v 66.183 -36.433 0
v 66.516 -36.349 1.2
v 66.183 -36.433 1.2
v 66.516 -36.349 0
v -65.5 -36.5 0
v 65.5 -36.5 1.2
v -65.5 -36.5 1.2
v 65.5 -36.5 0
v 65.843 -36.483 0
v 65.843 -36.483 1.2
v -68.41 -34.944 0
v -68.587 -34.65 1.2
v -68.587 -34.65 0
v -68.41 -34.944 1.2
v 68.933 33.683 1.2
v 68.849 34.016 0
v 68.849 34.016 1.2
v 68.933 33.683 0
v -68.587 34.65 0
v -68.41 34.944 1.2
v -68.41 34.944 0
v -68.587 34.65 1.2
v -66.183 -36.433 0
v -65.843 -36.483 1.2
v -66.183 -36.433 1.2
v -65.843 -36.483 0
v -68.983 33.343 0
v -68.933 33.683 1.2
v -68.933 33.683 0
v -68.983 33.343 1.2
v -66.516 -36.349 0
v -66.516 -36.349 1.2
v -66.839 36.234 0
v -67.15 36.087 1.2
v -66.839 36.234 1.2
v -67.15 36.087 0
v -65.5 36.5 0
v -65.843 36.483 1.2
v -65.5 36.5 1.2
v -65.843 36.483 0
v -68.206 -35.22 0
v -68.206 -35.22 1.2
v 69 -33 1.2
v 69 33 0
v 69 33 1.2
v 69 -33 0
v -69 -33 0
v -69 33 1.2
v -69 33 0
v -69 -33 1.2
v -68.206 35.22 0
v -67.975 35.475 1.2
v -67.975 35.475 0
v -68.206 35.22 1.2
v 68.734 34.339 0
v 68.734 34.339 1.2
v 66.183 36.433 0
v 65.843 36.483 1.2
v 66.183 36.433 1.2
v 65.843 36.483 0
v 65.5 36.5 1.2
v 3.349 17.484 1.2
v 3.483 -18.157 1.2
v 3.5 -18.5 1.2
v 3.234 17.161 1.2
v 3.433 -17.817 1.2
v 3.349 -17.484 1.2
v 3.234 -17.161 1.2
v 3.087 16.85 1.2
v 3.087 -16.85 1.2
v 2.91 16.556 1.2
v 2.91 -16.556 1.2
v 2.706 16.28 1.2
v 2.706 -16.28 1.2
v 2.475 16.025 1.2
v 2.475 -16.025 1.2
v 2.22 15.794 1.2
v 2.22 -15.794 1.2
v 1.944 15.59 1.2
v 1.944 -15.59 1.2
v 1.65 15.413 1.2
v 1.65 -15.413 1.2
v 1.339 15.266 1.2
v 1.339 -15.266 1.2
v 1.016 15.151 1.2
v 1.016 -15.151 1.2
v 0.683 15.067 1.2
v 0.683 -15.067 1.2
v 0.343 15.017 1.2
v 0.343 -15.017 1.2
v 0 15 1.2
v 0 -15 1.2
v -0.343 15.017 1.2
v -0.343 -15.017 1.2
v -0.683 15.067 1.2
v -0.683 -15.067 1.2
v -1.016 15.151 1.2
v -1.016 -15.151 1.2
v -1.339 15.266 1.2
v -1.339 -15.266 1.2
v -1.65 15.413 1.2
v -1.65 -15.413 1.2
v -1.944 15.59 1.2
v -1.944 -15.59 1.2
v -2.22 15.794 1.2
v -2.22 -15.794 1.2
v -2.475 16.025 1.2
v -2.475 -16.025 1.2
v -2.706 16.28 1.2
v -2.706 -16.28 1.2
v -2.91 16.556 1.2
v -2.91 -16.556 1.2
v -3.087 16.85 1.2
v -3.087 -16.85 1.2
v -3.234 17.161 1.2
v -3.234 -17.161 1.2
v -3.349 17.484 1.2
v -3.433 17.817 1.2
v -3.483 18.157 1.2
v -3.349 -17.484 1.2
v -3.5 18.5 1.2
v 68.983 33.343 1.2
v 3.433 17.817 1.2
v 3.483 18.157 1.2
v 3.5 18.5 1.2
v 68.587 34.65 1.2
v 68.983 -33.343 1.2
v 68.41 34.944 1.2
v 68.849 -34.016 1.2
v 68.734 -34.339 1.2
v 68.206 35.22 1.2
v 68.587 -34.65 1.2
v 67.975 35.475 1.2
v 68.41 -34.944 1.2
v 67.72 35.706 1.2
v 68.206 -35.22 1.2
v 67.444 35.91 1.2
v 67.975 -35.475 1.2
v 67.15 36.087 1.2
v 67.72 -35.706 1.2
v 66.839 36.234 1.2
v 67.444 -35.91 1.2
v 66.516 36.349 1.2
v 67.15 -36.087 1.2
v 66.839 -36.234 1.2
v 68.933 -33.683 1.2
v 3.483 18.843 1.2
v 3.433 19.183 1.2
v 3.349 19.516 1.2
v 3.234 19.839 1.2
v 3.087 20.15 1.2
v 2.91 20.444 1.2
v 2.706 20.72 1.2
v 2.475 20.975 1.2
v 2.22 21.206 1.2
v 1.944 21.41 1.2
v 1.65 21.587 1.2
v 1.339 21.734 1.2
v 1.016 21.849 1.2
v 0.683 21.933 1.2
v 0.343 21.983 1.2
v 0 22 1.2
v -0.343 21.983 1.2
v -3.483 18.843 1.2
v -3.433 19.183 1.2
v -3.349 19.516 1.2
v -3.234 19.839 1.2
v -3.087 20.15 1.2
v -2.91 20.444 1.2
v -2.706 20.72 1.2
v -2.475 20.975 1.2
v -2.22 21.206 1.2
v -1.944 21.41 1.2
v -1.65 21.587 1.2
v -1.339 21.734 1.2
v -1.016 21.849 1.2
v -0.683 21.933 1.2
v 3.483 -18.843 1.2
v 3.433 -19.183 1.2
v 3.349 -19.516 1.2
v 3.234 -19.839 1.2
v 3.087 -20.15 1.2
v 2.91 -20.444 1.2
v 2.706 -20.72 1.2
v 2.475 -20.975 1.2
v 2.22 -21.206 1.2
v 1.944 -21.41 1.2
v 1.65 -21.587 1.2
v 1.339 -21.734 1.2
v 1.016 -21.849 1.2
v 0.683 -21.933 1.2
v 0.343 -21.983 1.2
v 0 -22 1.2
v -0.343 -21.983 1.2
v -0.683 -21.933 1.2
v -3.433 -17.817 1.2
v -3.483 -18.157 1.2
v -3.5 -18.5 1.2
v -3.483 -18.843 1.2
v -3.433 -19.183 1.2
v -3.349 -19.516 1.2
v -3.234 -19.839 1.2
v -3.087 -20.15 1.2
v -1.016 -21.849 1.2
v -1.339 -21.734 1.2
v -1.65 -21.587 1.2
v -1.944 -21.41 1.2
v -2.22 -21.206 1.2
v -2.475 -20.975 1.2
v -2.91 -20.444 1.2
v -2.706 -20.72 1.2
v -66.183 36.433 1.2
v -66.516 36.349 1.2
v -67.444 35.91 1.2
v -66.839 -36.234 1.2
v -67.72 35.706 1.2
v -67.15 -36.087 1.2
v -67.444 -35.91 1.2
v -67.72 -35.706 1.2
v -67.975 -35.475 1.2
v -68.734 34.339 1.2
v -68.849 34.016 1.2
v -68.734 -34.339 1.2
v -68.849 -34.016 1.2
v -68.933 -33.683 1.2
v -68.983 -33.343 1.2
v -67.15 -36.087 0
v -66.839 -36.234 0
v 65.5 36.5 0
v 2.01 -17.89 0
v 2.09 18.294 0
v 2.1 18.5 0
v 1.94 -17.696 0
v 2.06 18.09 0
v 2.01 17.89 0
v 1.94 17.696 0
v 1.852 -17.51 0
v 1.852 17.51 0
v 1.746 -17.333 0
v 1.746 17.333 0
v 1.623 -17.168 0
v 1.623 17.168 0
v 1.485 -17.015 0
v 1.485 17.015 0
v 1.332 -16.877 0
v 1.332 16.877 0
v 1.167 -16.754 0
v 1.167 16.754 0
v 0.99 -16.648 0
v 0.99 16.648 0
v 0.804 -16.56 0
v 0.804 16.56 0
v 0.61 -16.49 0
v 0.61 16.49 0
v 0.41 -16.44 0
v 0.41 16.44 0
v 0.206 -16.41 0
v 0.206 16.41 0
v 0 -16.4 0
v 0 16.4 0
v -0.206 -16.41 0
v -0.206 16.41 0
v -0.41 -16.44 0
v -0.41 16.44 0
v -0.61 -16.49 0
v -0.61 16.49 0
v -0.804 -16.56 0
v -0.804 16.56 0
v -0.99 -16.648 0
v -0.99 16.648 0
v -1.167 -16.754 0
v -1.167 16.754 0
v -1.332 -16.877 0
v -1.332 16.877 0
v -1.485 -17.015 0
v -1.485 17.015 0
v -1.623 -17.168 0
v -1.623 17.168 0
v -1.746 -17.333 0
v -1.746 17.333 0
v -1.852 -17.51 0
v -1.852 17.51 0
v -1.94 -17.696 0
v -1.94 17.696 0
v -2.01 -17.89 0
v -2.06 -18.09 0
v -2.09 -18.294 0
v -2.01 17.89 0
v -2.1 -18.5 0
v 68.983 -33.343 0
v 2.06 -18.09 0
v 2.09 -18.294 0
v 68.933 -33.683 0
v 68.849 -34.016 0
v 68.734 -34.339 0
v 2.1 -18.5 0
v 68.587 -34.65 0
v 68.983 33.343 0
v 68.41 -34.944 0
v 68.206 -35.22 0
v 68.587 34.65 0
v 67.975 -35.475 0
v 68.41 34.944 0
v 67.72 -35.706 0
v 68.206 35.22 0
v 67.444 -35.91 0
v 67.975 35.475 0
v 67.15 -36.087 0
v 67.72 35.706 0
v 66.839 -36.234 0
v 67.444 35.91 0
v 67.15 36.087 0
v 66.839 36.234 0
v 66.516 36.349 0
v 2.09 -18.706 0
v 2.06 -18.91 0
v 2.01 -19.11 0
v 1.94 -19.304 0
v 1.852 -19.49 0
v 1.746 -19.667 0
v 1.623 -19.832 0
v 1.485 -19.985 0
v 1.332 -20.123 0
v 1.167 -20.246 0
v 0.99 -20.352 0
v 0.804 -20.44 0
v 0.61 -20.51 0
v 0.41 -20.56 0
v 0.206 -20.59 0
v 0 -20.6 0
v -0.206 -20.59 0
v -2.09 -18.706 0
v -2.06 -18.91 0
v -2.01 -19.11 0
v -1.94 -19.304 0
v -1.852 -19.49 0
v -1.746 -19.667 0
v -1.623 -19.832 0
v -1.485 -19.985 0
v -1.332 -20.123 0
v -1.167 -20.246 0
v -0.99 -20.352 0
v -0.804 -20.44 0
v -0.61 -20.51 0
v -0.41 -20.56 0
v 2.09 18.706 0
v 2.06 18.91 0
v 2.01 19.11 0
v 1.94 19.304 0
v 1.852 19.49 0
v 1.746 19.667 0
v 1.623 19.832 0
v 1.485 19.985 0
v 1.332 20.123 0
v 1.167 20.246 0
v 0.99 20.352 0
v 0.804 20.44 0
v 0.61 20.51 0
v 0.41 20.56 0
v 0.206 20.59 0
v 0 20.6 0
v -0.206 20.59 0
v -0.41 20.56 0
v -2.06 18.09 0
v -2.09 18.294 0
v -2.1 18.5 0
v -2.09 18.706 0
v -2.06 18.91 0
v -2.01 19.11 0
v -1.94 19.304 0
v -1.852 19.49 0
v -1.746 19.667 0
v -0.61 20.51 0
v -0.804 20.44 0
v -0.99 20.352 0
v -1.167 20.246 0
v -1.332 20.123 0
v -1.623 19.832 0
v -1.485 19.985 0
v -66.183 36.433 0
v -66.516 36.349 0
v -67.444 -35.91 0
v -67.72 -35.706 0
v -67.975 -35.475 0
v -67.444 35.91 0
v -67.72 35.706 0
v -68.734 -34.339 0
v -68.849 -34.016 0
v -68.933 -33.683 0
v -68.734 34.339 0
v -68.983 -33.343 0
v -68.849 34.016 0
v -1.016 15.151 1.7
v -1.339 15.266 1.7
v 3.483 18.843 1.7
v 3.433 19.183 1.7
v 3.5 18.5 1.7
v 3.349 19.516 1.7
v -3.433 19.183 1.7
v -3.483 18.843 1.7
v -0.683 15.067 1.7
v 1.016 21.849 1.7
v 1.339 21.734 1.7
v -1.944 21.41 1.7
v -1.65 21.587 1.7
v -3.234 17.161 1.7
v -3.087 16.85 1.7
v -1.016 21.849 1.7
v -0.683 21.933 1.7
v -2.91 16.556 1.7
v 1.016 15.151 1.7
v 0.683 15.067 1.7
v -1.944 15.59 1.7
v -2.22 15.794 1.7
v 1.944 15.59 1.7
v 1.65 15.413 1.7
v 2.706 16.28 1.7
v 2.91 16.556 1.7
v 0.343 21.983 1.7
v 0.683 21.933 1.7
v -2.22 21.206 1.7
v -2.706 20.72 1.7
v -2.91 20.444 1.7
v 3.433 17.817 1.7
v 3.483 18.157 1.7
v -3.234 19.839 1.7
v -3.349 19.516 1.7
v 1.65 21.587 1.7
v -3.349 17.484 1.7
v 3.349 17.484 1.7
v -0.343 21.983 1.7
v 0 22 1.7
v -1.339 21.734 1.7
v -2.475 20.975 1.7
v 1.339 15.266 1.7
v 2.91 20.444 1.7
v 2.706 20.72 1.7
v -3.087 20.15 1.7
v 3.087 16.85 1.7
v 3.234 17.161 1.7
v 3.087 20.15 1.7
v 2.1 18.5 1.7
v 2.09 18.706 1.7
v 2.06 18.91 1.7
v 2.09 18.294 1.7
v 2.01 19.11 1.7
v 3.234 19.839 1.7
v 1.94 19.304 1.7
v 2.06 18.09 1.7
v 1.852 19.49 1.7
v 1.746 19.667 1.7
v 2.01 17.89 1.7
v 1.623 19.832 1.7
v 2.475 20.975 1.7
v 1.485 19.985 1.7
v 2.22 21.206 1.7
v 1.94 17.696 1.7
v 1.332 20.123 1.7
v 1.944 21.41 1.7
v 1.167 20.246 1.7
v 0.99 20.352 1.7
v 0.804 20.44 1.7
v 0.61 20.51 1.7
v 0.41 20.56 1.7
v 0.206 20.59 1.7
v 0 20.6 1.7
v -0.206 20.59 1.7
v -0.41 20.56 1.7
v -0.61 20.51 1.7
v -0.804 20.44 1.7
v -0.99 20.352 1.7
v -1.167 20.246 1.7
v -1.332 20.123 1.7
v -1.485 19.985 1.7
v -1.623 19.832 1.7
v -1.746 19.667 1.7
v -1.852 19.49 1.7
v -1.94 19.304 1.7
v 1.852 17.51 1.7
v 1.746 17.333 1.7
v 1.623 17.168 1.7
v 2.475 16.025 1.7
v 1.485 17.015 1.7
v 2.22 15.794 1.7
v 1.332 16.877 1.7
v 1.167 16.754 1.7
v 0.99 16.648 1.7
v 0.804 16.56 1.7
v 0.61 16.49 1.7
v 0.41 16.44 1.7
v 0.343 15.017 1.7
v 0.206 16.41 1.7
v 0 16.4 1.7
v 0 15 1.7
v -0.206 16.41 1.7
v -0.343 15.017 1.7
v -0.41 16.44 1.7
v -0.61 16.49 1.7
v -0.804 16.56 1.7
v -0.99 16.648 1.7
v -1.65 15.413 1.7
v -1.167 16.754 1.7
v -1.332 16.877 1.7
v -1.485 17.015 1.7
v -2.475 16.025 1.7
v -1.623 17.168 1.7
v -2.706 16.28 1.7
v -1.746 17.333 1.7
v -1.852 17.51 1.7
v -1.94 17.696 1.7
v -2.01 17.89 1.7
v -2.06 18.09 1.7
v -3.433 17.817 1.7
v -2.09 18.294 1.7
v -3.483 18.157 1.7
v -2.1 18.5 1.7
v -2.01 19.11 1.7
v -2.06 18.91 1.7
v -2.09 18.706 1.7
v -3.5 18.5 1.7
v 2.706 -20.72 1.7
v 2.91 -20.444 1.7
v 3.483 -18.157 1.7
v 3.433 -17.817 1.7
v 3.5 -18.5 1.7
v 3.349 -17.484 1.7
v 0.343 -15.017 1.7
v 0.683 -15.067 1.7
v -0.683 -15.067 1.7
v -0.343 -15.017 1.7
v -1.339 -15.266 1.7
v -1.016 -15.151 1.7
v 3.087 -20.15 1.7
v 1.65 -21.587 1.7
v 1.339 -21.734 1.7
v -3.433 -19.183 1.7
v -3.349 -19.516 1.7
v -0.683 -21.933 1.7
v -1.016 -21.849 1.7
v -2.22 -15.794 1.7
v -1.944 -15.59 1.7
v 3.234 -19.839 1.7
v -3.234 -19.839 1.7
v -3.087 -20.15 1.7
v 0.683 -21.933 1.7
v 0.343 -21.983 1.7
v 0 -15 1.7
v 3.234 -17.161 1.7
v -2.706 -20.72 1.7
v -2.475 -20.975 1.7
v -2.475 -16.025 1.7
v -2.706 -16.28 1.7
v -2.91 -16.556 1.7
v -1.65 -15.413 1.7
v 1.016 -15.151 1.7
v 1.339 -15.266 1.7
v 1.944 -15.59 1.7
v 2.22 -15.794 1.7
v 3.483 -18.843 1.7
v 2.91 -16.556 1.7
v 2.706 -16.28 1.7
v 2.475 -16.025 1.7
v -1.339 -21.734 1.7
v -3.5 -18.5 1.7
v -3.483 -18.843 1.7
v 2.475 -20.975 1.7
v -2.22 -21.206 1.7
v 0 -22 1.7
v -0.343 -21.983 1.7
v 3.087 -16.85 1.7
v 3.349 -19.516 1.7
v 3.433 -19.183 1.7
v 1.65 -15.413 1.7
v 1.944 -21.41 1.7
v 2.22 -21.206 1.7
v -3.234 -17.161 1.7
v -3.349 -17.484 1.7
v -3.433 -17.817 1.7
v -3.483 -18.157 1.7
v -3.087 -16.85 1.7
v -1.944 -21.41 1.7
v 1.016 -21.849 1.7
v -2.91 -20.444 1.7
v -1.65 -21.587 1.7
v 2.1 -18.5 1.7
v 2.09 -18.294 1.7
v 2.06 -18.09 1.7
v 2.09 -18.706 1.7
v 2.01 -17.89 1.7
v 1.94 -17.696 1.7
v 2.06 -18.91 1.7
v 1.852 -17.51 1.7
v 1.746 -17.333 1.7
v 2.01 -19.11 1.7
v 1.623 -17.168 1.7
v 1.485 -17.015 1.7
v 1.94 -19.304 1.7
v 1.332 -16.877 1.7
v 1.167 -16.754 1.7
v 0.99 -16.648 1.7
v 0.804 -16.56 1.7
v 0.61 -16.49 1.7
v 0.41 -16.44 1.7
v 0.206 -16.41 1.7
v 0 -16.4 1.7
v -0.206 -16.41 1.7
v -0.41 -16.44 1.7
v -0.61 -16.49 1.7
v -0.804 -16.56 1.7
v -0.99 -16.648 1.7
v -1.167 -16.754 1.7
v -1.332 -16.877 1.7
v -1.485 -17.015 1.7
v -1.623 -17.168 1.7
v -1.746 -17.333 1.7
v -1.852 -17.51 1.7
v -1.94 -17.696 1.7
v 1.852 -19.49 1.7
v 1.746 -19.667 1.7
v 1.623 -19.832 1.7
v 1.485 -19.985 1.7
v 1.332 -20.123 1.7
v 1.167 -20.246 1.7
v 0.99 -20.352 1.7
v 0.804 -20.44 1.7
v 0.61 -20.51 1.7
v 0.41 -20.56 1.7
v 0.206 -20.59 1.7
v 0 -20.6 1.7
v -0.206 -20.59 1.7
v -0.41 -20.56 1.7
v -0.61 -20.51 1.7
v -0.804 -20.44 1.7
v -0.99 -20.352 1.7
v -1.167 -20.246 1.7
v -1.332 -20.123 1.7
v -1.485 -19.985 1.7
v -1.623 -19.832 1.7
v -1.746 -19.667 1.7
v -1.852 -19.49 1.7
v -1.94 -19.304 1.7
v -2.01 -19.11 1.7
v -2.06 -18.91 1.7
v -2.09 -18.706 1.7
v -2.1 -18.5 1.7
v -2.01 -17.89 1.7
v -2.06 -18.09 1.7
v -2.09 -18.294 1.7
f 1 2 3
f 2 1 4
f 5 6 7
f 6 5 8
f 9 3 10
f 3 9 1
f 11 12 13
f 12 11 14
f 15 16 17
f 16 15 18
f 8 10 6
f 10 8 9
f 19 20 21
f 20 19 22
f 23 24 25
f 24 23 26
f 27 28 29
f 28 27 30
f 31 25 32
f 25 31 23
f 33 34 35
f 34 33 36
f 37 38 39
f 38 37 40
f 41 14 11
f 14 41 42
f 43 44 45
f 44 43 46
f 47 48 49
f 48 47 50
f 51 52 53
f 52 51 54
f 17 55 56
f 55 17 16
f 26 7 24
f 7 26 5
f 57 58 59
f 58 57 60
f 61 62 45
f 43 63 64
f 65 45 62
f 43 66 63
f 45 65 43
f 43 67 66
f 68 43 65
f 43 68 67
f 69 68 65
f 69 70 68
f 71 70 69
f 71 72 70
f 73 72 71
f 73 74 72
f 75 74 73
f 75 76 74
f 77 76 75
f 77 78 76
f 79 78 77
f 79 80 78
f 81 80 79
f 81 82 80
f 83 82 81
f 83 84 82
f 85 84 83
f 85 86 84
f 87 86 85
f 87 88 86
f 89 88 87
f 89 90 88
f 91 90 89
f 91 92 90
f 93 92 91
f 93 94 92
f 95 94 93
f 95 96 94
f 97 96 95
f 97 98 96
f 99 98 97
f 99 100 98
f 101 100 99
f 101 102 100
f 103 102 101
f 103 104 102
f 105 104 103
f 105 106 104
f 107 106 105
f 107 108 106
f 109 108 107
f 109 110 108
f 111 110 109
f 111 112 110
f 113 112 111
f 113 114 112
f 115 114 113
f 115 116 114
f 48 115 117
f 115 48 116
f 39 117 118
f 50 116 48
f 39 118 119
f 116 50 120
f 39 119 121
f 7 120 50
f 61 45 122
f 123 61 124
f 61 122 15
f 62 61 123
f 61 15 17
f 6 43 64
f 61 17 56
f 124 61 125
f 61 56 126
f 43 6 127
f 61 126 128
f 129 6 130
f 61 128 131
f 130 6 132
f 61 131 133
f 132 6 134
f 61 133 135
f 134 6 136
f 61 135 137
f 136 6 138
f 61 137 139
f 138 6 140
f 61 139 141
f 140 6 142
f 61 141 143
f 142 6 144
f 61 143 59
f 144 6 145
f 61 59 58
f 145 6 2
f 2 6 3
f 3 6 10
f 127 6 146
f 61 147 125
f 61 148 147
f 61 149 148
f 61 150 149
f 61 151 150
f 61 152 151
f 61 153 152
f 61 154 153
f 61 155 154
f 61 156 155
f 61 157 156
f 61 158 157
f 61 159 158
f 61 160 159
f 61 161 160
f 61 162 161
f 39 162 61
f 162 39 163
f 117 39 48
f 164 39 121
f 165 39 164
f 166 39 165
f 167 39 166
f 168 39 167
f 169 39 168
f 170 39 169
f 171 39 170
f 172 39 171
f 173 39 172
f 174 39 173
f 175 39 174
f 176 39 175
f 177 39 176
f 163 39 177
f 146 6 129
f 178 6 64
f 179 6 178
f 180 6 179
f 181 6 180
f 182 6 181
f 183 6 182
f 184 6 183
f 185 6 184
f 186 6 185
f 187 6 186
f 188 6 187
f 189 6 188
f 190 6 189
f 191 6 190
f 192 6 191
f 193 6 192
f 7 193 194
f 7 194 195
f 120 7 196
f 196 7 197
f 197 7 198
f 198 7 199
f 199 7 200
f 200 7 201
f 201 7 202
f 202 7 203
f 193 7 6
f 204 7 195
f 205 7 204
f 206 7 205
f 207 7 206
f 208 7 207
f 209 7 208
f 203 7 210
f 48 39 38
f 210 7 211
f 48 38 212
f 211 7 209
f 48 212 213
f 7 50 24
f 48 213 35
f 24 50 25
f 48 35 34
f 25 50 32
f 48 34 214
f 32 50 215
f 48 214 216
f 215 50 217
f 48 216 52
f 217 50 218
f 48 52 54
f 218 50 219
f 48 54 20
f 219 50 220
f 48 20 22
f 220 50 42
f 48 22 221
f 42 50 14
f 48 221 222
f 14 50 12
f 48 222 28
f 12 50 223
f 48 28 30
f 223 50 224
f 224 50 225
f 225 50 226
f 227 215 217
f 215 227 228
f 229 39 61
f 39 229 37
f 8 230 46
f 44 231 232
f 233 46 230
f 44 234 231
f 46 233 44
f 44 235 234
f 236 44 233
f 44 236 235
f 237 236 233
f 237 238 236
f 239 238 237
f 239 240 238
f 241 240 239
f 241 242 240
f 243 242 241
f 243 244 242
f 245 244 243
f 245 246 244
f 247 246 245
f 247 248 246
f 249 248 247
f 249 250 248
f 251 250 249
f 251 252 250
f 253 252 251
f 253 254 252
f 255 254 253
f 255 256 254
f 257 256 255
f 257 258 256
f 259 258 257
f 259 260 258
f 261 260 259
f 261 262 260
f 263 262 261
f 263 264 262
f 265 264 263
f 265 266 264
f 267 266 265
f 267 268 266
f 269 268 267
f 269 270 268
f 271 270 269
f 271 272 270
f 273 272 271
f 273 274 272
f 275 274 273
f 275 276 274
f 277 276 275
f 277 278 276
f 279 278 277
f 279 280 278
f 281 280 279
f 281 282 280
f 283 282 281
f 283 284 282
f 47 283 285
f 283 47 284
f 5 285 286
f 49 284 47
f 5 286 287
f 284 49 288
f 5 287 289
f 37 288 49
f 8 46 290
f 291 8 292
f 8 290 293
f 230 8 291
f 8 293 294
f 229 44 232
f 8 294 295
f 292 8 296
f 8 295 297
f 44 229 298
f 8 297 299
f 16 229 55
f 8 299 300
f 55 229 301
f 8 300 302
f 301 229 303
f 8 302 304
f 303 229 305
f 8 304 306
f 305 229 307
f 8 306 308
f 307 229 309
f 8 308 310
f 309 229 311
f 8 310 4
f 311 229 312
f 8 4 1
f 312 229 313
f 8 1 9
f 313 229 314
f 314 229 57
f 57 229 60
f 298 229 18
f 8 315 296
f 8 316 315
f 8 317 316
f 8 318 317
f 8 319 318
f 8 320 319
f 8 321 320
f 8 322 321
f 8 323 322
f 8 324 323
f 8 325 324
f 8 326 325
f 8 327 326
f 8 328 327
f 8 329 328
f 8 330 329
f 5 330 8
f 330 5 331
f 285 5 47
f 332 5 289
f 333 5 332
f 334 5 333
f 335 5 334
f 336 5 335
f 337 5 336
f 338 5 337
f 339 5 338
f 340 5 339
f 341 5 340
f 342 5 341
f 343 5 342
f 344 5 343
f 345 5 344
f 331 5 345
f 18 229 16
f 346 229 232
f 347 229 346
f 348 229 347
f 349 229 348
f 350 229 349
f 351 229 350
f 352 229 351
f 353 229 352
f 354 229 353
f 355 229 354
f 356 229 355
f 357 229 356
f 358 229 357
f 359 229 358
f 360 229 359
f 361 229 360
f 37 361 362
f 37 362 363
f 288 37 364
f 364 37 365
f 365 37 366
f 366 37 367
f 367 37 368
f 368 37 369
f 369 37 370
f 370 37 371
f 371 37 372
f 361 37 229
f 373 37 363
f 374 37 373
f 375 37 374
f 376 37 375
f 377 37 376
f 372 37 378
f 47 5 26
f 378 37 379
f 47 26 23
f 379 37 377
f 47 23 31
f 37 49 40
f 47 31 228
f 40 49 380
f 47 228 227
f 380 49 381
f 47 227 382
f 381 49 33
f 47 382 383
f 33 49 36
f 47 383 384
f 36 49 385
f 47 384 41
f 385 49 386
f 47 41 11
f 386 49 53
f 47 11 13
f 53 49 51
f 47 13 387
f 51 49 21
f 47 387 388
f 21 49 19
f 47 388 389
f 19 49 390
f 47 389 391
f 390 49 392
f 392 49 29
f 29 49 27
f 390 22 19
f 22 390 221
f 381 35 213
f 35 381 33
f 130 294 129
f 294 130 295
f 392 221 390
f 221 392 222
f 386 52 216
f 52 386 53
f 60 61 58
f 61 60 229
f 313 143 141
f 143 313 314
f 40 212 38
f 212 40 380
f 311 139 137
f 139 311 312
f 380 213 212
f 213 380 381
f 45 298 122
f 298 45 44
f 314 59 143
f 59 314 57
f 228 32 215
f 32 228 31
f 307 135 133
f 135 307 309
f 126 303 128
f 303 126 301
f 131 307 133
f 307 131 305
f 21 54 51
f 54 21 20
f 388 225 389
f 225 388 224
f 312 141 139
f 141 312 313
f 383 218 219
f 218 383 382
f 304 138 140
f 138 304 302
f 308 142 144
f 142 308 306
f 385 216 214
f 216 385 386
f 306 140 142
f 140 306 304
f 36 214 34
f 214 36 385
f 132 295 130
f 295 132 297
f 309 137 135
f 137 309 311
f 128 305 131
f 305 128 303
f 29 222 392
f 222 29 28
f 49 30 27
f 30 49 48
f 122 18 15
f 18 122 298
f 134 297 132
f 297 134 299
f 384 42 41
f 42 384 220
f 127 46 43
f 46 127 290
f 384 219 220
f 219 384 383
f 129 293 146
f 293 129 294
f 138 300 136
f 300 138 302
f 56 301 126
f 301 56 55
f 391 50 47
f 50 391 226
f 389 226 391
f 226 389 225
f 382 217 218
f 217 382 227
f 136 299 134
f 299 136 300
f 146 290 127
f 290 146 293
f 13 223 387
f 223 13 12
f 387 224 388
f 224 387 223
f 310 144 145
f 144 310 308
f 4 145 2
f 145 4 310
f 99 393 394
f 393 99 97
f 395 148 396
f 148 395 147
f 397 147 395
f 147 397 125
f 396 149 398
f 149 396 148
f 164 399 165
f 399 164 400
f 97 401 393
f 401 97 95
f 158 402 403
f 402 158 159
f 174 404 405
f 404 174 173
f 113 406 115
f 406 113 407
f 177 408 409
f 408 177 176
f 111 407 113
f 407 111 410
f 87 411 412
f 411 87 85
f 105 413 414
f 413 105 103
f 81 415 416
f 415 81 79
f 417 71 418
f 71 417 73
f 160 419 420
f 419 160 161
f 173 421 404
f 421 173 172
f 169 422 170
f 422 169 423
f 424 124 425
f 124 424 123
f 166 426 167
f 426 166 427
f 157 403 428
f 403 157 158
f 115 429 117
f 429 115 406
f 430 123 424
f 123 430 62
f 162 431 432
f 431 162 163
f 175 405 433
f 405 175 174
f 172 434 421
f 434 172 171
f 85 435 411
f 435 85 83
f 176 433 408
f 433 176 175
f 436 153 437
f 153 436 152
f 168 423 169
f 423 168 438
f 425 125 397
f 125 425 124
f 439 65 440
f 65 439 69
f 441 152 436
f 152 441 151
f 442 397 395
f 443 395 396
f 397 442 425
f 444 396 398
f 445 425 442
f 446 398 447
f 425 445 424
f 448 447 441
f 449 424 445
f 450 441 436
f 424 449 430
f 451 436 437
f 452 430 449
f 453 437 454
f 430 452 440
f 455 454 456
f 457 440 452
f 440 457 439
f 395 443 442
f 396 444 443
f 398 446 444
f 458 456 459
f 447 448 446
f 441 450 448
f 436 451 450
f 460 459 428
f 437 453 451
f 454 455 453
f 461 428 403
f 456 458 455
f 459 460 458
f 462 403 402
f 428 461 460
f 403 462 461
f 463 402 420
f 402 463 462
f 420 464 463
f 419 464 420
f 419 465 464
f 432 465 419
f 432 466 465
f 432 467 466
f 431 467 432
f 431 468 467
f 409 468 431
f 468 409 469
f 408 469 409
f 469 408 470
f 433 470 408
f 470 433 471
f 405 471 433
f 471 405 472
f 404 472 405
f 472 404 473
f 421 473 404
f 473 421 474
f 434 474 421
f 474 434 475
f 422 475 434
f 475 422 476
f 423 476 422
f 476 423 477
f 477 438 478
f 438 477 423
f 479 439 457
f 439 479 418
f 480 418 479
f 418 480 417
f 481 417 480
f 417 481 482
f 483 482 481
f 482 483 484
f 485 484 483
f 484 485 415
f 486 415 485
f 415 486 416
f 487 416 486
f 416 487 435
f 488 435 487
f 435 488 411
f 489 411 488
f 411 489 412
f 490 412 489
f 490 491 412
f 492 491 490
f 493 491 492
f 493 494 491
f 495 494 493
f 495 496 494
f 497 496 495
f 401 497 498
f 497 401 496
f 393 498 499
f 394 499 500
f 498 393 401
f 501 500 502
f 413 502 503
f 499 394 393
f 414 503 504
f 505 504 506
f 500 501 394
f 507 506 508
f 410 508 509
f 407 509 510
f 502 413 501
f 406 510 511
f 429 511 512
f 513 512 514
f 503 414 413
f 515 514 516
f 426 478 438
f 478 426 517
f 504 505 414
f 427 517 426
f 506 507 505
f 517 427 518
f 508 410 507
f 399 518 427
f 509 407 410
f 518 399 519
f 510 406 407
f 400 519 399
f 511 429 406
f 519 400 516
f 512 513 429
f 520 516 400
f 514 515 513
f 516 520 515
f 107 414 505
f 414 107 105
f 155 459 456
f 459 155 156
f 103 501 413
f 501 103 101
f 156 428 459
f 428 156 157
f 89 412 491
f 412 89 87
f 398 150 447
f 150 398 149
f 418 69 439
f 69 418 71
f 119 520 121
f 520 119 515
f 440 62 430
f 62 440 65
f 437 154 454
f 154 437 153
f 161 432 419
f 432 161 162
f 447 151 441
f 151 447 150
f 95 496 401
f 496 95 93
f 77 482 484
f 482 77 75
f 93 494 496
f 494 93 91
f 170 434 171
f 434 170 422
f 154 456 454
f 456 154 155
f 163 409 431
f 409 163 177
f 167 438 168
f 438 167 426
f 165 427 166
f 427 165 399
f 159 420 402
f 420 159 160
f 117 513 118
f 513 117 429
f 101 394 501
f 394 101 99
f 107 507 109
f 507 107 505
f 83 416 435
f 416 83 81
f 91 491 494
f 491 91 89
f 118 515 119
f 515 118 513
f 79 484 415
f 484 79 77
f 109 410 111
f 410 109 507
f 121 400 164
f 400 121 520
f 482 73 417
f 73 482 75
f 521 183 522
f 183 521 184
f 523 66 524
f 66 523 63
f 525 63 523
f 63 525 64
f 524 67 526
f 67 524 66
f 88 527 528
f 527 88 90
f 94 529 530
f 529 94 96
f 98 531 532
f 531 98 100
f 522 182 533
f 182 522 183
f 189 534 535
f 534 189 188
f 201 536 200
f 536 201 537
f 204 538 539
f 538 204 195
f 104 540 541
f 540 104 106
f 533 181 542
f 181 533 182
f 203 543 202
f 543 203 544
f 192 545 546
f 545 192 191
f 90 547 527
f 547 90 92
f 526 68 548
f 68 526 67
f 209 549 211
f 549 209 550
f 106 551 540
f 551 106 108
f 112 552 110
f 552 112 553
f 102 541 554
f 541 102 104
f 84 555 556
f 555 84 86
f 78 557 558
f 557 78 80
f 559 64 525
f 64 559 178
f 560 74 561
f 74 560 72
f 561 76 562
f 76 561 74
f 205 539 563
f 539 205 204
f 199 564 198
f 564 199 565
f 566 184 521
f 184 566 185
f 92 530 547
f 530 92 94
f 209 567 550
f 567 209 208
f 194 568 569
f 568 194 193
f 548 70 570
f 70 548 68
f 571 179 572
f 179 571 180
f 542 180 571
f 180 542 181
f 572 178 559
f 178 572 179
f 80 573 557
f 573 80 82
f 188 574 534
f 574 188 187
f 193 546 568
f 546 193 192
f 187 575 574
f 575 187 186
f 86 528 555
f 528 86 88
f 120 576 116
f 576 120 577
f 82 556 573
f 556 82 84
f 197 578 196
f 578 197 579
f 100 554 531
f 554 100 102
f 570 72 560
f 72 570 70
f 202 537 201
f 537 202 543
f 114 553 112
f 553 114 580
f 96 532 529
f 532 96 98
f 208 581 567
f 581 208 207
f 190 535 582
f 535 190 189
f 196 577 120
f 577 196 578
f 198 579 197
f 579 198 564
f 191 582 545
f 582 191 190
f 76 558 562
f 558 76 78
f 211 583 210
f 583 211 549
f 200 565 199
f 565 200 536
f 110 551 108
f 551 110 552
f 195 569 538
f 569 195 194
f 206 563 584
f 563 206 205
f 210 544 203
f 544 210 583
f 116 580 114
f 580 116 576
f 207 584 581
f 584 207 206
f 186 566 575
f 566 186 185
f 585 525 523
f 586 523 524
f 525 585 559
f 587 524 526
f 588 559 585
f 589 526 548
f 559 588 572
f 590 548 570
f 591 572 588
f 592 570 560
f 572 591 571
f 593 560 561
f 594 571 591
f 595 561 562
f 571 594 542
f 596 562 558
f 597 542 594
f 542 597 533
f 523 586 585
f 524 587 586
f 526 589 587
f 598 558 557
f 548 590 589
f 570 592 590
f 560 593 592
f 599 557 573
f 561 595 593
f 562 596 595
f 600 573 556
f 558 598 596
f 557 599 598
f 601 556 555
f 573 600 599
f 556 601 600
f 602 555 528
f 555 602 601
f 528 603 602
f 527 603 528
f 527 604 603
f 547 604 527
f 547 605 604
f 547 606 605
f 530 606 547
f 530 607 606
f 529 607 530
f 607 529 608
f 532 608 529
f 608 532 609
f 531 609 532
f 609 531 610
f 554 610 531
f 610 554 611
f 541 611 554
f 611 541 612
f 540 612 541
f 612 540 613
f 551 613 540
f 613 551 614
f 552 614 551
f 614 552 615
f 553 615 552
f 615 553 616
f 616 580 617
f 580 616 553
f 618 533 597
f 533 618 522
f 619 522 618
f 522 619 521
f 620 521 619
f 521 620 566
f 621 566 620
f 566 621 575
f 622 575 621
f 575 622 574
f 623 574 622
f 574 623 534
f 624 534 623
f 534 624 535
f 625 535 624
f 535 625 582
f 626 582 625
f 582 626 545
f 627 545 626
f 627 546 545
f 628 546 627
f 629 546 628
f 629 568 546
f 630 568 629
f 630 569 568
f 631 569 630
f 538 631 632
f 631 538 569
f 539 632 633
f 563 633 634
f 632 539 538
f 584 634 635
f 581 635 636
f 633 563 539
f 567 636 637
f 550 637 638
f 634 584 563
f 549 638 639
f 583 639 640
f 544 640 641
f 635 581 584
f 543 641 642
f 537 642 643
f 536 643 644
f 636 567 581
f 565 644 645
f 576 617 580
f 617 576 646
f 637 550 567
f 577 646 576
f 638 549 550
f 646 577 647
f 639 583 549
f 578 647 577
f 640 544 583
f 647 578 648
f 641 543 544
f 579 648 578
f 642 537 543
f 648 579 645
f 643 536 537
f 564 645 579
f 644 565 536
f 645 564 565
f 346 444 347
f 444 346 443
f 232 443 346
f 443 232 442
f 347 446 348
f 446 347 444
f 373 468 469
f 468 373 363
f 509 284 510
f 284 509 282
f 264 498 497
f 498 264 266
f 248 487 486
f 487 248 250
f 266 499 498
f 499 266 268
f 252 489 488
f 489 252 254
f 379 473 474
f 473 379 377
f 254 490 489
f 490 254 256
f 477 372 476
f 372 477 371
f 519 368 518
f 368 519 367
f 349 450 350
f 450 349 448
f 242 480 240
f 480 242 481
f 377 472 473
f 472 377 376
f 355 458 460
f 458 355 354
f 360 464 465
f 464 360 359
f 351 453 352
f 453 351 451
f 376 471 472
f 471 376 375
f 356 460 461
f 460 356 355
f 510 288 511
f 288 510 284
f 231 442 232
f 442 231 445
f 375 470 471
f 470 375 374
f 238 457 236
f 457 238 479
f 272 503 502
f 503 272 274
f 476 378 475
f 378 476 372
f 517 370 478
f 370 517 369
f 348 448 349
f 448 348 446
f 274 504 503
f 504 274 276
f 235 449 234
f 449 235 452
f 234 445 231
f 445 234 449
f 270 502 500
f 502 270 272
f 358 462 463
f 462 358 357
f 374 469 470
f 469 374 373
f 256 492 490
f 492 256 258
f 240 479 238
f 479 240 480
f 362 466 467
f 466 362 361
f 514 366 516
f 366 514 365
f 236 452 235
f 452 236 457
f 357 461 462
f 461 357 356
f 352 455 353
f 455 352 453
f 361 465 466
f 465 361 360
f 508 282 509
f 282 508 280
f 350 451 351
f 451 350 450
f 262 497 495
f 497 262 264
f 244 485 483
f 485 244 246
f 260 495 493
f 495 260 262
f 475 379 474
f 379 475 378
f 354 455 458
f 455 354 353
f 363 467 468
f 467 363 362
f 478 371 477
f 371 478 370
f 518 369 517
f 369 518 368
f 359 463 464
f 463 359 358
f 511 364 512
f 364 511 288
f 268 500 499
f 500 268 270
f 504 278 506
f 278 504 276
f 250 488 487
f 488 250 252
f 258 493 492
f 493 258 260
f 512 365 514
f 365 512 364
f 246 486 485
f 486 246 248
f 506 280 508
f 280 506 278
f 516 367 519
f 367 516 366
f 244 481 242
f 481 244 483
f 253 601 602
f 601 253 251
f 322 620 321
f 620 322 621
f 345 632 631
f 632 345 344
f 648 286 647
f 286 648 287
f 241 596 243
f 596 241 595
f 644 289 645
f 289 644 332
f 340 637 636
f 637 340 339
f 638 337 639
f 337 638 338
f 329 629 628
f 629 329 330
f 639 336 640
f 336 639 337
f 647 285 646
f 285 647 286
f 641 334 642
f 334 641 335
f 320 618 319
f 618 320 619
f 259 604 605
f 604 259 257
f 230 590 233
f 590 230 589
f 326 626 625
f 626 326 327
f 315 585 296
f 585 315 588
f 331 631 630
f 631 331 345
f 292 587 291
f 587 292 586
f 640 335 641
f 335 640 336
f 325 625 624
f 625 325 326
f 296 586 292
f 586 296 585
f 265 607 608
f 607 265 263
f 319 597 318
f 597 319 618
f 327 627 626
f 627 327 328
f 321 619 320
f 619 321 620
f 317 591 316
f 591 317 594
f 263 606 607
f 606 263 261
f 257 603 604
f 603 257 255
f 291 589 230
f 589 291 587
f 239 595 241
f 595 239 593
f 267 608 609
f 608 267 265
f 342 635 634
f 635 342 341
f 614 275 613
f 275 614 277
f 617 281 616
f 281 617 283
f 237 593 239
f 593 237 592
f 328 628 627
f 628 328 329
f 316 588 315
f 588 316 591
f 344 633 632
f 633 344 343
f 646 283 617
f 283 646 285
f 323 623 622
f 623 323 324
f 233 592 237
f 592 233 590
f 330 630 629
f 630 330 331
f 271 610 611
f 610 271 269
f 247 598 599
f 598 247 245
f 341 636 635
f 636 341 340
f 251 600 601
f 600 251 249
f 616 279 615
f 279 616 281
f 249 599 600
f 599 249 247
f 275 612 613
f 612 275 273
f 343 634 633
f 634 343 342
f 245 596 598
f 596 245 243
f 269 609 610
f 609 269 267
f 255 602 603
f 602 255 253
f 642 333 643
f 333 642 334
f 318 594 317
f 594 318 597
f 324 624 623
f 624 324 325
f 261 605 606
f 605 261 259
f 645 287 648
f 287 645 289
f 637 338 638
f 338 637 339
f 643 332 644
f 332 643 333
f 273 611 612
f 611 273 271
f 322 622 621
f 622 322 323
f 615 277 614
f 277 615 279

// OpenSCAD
$fn = 64;
module blank_plaque() {
  difference() {
    union() {
      linear_extrude(height=1.200)
        offset(r=3.500) offset(r=-3.500)
          square([138.000, 73.000], center=true);
      translate([0.000, 18.500, 0]) cylinder(h=1.700, r=3.500);
      translate([0.000, -18.500, 0]) cylinder(h=1.700, r=3.500);
    }
    translate([0.000, 18.500, -1]) cylinder(h=3.700, r=2.100);
    translate([0.000, -18.500, -1]) cylinder(h=3.700, r=2.100);
  }
}

blank_plaque();
